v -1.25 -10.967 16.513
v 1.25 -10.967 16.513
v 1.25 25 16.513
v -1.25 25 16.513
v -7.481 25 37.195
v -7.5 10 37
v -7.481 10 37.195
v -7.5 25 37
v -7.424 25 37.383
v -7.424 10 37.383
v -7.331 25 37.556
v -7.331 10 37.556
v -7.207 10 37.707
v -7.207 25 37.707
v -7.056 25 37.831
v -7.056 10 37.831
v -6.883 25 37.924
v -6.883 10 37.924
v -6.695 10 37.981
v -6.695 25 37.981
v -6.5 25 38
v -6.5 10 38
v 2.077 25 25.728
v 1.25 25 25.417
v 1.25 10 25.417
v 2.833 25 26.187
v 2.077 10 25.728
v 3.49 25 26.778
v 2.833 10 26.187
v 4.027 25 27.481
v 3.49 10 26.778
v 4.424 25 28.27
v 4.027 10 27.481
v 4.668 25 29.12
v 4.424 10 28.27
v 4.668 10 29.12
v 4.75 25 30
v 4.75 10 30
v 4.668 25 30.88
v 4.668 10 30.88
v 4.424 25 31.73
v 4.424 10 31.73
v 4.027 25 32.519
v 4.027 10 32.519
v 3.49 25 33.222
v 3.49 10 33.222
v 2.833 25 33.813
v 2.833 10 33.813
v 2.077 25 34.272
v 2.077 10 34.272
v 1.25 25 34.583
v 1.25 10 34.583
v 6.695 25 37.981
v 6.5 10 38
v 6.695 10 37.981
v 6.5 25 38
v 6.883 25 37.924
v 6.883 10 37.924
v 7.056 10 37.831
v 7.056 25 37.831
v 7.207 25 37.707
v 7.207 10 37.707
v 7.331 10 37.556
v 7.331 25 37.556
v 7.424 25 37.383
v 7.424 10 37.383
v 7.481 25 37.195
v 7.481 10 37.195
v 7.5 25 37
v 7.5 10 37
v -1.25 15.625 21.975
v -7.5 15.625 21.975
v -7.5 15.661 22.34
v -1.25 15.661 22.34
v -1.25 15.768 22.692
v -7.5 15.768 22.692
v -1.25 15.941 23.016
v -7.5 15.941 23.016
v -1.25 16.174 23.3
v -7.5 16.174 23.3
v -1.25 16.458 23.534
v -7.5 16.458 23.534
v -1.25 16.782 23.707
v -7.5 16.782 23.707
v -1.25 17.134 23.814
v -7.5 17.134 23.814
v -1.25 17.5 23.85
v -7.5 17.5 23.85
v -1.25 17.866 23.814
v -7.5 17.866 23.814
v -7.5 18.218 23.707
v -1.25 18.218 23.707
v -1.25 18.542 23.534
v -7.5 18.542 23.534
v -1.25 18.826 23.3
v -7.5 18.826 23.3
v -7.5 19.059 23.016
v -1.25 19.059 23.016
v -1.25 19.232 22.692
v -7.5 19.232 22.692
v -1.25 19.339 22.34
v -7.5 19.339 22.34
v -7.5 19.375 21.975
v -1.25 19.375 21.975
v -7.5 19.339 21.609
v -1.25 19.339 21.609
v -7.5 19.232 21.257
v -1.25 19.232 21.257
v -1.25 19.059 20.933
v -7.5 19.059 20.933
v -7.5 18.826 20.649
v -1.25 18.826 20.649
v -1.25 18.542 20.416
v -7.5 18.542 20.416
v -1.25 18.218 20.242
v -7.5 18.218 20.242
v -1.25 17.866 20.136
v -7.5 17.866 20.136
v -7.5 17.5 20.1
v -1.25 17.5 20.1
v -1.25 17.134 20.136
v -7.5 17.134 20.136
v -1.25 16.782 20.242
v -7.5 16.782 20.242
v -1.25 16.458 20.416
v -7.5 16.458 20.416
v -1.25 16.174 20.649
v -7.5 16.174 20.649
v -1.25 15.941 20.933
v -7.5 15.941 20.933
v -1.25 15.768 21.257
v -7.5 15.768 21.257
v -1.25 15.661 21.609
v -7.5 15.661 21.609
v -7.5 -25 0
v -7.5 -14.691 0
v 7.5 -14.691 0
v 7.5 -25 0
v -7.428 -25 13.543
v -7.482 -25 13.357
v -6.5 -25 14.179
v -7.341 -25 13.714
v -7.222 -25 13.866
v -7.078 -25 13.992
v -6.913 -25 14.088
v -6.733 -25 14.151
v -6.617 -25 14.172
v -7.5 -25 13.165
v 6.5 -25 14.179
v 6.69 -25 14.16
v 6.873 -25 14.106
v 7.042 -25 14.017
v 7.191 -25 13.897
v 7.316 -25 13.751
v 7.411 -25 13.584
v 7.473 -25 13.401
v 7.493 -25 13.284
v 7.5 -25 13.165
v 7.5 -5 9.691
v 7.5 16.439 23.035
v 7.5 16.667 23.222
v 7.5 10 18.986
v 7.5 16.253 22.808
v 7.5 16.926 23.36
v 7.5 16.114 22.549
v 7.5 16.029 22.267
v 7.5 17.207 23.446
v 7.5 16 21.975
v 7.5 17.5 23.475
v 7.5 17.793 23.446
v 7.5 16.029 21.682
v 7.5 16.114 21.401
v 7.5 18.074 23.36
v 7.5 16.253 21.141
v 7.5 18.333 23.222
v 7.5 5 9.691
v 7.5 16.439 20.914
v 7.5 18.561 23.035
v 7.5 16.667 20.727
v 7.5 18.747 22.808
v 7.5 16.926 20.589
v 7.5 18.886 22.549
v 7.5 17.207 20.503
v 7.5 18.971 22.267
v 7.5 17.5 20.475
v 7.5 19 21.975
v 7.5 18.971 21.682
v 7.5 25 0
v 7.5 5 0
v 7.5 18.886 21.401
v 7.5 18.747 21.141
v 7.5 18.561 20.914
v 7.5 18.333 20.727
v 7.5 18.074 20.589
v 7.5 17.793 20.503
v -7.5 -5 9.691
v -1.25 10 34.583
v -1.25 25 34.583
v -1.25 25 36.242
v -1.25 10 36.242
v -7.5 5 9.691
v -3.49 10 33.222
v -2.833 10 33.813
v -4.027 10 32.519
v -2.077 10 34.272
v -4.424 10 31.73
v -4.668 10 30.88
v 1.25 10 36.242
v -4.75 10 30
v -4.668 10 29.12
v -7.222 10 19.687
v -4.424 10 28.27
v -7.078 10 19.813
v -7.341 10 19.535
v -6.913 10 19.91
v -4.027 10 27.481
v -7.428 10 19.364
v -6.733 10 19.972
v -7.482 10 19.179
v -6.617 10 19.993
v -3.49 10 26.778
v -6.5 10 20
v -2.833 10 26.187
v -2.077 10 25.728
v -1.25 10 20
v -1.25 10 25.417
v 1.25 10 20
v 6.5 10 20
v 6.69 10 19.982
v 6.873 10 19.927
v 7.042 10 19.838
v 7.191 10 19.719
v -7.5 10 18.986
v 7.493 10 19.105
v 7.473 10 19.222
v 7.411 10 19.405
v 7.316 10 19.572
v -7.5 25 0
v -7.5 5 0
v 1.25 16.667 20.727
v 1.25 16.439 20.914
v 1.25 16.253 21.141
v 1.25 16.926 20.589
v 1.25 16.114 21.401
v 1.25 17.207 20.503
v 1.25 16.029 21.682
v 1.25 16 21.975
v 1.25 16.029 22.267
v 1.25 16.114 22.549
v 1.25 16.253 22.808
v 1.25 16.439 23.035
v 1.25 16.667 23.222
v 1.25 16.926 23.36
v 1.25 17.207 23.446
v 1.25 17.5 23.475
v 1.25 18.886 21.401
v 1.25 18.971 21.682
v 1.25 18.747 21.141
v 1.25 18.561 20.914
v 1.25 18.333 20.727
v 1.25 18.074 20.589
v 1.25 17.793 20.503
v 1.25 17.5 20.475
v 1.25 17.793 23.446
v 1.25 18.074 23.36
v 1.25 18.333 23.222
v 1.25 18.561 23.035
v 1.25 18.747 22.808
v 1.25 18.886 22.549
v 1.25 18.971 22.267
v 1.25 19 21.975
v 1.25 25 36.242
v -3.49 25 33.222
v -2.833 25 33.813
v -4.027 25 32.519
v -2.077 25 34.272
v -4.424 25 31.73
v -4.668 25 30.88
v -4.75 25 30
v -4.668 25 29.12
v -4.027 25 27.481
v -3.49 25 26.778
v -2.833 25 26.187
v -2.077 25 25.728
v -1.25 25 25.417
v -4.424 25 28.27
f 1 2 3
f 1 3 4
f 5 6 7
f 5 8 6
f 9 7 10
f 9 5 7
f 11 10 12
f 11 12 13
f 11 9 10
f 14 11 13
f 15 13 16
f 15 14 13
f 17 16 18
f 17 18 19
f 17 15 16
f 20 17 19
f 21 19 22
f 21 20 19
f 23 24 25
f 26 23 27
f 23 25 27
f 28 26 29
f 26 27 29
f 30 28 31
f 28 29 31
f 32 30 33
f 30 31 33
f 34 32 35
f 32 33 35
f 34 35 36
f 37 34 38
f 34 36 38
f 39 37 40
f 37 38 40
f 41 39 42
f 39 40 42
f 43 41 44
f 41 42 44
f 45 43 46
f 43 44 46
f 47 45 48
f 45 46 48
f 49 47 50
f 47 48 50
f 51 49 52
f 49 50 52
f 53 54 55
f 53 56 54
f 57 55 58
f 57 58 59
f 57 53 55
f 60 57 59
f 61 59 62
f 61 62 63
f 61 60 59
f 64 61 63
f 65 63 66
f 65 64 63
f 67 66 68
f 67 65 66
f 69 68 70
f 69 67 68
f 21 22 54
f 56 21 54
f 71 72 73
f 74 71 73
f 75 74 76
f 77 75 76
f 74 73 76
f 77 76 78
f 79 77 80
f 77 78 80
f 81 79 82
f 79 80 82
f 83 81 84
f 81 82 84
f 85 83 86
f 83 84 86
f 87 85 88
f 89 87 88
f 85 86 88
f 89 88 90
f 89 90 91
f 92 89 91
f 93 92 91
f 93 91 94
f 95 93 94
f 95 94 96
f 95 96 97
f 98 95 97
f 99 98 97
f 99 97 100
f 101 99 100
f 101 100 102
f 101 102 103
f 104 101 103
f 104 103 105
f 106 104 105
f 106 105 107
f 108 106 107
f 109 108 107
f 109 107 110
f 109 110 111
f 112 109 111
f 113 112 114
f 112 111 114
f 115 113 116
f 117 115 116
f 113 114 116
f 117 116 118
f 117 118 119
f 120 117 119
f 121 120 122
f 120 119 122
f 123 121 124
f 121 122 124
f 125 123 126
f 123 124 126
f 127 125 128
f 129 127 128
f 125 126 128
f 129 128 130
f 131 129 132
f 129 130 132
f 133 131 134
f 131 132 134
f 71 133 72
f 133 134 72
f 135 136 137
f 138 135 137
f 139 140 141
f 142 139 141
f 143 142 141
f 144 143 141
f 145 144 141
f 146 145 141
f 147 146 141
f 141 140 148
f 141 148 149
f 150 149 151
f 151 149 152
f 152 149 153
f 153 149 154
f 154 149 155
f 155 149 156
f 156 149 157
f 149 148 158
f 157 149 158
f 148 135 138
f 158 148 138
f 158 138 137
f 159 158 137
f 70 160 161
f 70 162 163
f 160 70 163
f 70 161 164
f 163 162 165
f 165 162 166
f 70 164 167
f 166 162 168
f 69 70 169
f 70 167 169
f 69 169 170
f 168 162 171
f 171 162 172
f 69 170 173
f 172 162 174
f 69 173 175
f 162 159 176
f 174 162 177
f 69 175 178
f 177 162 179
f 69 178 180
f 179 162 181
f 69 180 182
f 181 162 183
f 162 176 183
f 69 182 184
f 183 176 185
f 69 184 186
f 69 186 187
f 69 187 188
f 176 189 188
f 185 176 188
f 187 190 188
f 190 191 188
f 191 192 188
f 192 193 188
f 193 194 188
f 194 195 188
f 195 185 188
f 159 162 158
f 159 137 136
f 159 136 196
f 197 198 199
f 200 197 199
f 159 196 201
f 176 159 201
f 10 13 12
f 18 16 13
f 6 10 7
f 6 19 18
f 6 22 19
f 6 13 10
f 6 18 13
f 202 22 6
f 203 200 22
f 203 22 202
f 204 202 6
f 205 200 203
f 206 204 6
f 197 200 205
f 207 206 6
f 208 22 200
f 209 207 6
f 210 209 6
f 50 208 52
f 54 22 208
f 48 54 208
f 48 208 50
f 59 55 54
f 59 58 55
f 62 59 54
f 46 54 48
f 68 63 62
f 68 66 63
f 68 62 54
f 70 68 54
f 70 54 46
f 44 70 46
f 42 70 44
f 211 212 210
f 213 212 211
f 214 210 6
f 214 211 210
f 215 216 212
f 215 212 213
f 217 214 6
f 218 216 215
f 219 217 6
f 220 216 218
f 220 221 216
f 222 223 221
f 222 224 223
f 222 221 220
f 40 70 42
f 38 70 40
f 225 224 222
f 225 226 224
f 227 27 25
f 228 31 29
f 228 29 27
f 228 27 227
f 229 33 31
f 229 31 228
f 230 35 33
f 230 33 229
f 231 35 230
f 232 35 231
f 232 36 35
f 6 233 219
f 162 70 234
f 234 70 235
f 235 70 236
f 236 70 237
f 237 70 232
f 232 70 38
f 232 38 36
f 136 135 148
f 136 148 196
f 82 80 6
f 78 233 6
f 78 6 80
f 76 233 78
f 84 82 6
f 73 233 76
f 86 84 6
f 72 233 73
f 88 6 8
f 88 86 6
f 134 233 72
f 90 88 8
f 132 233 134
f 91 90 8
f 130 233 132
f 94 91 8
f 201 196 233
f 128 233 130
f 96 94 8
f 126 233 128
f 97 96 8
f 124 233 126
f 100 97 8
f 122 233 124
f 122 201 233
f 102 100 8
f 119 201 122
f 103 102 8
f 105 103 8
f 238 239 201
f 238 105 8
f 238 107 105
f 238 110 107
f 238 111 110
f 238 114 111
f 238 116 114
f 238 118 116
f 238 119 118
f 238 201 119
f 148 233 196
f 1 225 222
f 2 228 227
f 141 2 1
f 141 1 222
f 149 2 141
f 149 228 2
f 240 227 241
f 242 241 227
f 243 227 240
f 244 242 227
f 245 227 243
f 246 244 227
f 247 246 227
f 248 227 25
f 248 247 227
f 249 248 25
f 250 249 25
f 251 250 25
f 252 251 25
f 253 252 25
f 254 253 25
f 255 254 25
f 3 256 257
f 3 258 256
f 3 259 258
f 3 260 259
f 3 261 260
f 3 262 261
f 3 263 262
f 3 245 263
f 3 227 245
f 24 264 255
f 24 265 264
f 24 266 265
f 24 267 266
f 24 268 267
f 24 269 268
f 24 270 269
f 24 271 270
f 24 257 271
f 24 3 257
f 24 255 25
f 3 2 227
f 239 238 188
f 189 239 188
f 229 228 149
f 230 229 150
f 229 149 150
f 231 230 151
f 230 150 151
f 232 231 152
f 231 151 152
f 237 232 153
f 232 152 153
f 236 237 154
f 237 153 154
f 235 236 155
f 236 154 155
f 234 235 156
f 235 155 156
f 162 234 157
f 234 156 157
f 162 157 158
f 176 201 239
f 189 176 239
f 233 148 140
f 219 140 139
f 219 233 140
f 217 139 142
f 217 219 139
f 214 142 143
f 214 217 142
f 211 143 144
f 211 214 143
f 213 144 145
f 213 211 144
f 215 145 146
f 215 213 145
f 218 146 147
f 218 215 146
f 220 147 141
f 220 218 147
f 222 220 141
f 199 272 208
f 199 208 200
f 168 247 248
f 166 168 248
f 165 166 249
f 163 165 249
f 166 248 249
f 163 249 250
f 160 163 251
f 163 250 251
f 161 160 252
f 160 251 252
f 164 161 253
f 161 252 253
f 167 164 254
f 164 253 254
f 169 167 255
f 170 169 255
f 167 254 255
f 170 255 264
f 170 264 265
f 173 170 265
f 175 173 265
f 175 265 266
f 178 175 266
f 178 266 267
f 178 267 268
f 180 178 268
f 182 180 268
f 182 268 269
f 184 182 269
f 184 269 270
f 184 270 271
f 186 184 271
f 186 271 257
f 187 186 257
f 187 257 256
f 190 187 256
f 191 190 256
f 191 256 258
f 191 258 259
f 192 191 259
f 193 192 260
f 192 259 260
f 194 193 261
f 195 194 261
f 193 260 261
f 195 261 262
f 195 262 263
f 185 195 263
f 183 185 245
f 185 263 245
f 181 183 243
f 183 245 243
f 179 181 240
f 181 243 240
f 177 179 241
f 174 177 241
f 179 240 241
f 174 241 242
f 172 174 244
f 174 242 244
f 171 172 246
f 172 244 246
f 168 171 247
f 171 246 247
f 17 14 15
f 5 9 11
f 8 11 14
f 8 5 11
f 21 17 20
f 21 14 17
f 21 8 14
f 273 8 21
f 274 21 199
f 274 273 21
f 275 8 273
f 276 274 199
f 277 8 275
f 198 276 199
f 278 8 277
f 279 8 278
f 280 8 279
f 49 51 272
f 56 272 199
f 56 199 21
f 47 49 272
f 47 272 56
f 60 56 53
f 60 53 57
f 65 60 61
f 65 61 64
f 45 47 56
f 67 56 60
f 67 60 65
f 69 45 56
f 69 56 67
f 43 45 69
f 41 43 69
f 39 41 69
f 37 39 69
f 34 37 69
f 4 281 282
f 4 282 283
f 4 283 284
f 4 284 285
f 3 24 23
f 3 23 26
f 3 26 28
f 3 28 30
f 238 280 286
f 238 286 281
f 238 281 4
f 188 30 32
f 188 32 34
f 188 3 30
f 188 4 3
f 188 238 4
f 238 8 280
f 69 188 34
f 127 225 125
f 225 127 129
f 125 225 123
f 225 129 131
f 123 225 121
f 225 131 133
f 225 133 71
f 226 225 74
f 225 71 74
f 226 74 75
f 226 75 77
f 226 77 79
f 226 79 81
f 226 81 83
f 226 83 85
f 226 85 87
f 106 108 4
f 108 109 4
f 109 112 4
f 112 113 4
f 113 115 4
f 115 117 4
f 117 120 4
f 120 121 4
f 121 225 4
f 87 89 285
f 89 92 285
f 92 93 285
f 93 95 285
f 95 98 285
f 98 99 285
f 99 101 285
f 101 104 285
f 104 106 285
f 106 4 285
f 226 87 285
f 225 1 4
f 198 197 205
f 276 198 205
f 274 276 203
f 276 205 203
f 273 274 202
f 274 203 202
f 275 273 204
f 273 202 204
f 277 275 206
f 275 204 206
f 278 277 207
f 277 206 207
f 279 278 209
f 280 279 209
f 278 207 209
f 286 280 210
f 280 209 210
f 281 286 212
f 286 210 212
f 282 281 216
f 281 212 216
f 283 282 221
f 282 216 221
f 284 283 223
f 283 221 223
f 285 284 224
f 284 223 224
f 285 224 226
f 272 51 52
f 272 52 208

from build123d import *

# Parameters (mm, degrees)
SKETCH_W        = 15
SKETCH_H        = 50
PAD_DEPTH       = 38
SKETCH001_R     = 4.75
POCKET_DEPTH    = 50.001
POCKET001_DEPTH = 15.001
POCKET002_DEPTH = 15.001
SKETCH005_W     = 2.5
SKETCH005_H     = 19.729757
POCKET003_DEPTH = 50.001
SKETCH006_R     = 1.5
POCKET004_DEPTH = 15.001
SKETCH007_R     = 1.875
POCKET005_DEPTH = 7
FILLET_R        = 1


with BuildPart() as part:
    # Sketch → Pad (new body)
    with BuildSketch(Plane.XY):
        Rectangle(SKETCH_W, SKETCH_H)
    extrude(amount=PAD_DEPTH)

    # Sketch001 (on Face3 of Pad) → Pocket (cut, through all)
    with BuildSketch(Plane.XZ.offset(25)):
        with Locations((0, 30)):
            Circle(SKETCH001_R)
    extrude(amount=-POCKET_DEPTH, mode=Mode.SUBTRACT)

    # Sketch003 (on Face5 of Pocket) → Pocket001 (cut, through all)
    with BuildSketch(Plane.YZ.offset(7.5)):
        Polygon((10, 42.759873), (10, 20), (-31.063036, 13.17035), (-31.063036, 49.393513), align=None)
    extrude(amount=-POCKET001_DEPTH, mode=Mode.SUBTRACT)

    # Sketch004 (on Face2 of Pocket001) → Pocket002 (cut, through all)
    with BuildSketch(Plane(origin=(-7.5, 0, 0), x_dir=(0, -1, 0), z_dir=(-1, 0, 0))):
        Polygon((18.707549, -4.016844), (5, 9.690705), (-5, 9.690705), (-5, -5.466326), align=None)
    extrude(amount=-POCKET002_DEPTH, mode=Mode.SUBTRACT)

    # Sketch005 (on Face1 of Pocket002) → Pocket003 (cut, through all)
    with BuildSketch(Plane(origin=(0, 25, 0), x_dir=(-1, 0, 0), z_dir=(0, 1, 0))):
        with Locations((0, 26.377617)):
            Rectangle(SKETCH005_W, SKETCH005_H)
    extrude(amount=-POCKET003_DEPTH, mode=Mode.SUBTRACT)

    # Sketch006 (on Face2 of Pocket003) → Pocket004 (cut, through all)
    with BuildSketch(Plane(origin=(-7.5, 0, 0), x_dir=(0, -1, 0), z_dir=(-1, 0, 0))):
        with Locations((-17.5, 21.974657)):
            Circle(SKETCH006_R)
    extrude(amount=-POCKET004_DEPTH, mode=Mode.SUBTRACT)

    # Sketch007 (on Face2 of Pocket004) → Pocket005 (cut)
    with BuildSketch(Plane(origin=(-7.5, 0, 0), x_dir=(0, -1, 0), z_dir=(-1, 0, 0))):
        with Locations((-17.5, 21.974657)):
            Circle(SKETCH007_R)
    extrude(amount=-POCKET005_DEPTH, mode=Mode.SUBTRACT)

    # Fillet
    fillet_edges = [part.edges().sort_by_distance(p)[0] for p in [
        (-7.5, 17.5, 38),
        (7.5, 17.5, 38),
        (7.5, -7.5, 17.08938),
        (-7.5, -7.5, 17.08938),
    ]]
    fillet(fillet_edges, radius=FILLET_R)


solid = part.part
